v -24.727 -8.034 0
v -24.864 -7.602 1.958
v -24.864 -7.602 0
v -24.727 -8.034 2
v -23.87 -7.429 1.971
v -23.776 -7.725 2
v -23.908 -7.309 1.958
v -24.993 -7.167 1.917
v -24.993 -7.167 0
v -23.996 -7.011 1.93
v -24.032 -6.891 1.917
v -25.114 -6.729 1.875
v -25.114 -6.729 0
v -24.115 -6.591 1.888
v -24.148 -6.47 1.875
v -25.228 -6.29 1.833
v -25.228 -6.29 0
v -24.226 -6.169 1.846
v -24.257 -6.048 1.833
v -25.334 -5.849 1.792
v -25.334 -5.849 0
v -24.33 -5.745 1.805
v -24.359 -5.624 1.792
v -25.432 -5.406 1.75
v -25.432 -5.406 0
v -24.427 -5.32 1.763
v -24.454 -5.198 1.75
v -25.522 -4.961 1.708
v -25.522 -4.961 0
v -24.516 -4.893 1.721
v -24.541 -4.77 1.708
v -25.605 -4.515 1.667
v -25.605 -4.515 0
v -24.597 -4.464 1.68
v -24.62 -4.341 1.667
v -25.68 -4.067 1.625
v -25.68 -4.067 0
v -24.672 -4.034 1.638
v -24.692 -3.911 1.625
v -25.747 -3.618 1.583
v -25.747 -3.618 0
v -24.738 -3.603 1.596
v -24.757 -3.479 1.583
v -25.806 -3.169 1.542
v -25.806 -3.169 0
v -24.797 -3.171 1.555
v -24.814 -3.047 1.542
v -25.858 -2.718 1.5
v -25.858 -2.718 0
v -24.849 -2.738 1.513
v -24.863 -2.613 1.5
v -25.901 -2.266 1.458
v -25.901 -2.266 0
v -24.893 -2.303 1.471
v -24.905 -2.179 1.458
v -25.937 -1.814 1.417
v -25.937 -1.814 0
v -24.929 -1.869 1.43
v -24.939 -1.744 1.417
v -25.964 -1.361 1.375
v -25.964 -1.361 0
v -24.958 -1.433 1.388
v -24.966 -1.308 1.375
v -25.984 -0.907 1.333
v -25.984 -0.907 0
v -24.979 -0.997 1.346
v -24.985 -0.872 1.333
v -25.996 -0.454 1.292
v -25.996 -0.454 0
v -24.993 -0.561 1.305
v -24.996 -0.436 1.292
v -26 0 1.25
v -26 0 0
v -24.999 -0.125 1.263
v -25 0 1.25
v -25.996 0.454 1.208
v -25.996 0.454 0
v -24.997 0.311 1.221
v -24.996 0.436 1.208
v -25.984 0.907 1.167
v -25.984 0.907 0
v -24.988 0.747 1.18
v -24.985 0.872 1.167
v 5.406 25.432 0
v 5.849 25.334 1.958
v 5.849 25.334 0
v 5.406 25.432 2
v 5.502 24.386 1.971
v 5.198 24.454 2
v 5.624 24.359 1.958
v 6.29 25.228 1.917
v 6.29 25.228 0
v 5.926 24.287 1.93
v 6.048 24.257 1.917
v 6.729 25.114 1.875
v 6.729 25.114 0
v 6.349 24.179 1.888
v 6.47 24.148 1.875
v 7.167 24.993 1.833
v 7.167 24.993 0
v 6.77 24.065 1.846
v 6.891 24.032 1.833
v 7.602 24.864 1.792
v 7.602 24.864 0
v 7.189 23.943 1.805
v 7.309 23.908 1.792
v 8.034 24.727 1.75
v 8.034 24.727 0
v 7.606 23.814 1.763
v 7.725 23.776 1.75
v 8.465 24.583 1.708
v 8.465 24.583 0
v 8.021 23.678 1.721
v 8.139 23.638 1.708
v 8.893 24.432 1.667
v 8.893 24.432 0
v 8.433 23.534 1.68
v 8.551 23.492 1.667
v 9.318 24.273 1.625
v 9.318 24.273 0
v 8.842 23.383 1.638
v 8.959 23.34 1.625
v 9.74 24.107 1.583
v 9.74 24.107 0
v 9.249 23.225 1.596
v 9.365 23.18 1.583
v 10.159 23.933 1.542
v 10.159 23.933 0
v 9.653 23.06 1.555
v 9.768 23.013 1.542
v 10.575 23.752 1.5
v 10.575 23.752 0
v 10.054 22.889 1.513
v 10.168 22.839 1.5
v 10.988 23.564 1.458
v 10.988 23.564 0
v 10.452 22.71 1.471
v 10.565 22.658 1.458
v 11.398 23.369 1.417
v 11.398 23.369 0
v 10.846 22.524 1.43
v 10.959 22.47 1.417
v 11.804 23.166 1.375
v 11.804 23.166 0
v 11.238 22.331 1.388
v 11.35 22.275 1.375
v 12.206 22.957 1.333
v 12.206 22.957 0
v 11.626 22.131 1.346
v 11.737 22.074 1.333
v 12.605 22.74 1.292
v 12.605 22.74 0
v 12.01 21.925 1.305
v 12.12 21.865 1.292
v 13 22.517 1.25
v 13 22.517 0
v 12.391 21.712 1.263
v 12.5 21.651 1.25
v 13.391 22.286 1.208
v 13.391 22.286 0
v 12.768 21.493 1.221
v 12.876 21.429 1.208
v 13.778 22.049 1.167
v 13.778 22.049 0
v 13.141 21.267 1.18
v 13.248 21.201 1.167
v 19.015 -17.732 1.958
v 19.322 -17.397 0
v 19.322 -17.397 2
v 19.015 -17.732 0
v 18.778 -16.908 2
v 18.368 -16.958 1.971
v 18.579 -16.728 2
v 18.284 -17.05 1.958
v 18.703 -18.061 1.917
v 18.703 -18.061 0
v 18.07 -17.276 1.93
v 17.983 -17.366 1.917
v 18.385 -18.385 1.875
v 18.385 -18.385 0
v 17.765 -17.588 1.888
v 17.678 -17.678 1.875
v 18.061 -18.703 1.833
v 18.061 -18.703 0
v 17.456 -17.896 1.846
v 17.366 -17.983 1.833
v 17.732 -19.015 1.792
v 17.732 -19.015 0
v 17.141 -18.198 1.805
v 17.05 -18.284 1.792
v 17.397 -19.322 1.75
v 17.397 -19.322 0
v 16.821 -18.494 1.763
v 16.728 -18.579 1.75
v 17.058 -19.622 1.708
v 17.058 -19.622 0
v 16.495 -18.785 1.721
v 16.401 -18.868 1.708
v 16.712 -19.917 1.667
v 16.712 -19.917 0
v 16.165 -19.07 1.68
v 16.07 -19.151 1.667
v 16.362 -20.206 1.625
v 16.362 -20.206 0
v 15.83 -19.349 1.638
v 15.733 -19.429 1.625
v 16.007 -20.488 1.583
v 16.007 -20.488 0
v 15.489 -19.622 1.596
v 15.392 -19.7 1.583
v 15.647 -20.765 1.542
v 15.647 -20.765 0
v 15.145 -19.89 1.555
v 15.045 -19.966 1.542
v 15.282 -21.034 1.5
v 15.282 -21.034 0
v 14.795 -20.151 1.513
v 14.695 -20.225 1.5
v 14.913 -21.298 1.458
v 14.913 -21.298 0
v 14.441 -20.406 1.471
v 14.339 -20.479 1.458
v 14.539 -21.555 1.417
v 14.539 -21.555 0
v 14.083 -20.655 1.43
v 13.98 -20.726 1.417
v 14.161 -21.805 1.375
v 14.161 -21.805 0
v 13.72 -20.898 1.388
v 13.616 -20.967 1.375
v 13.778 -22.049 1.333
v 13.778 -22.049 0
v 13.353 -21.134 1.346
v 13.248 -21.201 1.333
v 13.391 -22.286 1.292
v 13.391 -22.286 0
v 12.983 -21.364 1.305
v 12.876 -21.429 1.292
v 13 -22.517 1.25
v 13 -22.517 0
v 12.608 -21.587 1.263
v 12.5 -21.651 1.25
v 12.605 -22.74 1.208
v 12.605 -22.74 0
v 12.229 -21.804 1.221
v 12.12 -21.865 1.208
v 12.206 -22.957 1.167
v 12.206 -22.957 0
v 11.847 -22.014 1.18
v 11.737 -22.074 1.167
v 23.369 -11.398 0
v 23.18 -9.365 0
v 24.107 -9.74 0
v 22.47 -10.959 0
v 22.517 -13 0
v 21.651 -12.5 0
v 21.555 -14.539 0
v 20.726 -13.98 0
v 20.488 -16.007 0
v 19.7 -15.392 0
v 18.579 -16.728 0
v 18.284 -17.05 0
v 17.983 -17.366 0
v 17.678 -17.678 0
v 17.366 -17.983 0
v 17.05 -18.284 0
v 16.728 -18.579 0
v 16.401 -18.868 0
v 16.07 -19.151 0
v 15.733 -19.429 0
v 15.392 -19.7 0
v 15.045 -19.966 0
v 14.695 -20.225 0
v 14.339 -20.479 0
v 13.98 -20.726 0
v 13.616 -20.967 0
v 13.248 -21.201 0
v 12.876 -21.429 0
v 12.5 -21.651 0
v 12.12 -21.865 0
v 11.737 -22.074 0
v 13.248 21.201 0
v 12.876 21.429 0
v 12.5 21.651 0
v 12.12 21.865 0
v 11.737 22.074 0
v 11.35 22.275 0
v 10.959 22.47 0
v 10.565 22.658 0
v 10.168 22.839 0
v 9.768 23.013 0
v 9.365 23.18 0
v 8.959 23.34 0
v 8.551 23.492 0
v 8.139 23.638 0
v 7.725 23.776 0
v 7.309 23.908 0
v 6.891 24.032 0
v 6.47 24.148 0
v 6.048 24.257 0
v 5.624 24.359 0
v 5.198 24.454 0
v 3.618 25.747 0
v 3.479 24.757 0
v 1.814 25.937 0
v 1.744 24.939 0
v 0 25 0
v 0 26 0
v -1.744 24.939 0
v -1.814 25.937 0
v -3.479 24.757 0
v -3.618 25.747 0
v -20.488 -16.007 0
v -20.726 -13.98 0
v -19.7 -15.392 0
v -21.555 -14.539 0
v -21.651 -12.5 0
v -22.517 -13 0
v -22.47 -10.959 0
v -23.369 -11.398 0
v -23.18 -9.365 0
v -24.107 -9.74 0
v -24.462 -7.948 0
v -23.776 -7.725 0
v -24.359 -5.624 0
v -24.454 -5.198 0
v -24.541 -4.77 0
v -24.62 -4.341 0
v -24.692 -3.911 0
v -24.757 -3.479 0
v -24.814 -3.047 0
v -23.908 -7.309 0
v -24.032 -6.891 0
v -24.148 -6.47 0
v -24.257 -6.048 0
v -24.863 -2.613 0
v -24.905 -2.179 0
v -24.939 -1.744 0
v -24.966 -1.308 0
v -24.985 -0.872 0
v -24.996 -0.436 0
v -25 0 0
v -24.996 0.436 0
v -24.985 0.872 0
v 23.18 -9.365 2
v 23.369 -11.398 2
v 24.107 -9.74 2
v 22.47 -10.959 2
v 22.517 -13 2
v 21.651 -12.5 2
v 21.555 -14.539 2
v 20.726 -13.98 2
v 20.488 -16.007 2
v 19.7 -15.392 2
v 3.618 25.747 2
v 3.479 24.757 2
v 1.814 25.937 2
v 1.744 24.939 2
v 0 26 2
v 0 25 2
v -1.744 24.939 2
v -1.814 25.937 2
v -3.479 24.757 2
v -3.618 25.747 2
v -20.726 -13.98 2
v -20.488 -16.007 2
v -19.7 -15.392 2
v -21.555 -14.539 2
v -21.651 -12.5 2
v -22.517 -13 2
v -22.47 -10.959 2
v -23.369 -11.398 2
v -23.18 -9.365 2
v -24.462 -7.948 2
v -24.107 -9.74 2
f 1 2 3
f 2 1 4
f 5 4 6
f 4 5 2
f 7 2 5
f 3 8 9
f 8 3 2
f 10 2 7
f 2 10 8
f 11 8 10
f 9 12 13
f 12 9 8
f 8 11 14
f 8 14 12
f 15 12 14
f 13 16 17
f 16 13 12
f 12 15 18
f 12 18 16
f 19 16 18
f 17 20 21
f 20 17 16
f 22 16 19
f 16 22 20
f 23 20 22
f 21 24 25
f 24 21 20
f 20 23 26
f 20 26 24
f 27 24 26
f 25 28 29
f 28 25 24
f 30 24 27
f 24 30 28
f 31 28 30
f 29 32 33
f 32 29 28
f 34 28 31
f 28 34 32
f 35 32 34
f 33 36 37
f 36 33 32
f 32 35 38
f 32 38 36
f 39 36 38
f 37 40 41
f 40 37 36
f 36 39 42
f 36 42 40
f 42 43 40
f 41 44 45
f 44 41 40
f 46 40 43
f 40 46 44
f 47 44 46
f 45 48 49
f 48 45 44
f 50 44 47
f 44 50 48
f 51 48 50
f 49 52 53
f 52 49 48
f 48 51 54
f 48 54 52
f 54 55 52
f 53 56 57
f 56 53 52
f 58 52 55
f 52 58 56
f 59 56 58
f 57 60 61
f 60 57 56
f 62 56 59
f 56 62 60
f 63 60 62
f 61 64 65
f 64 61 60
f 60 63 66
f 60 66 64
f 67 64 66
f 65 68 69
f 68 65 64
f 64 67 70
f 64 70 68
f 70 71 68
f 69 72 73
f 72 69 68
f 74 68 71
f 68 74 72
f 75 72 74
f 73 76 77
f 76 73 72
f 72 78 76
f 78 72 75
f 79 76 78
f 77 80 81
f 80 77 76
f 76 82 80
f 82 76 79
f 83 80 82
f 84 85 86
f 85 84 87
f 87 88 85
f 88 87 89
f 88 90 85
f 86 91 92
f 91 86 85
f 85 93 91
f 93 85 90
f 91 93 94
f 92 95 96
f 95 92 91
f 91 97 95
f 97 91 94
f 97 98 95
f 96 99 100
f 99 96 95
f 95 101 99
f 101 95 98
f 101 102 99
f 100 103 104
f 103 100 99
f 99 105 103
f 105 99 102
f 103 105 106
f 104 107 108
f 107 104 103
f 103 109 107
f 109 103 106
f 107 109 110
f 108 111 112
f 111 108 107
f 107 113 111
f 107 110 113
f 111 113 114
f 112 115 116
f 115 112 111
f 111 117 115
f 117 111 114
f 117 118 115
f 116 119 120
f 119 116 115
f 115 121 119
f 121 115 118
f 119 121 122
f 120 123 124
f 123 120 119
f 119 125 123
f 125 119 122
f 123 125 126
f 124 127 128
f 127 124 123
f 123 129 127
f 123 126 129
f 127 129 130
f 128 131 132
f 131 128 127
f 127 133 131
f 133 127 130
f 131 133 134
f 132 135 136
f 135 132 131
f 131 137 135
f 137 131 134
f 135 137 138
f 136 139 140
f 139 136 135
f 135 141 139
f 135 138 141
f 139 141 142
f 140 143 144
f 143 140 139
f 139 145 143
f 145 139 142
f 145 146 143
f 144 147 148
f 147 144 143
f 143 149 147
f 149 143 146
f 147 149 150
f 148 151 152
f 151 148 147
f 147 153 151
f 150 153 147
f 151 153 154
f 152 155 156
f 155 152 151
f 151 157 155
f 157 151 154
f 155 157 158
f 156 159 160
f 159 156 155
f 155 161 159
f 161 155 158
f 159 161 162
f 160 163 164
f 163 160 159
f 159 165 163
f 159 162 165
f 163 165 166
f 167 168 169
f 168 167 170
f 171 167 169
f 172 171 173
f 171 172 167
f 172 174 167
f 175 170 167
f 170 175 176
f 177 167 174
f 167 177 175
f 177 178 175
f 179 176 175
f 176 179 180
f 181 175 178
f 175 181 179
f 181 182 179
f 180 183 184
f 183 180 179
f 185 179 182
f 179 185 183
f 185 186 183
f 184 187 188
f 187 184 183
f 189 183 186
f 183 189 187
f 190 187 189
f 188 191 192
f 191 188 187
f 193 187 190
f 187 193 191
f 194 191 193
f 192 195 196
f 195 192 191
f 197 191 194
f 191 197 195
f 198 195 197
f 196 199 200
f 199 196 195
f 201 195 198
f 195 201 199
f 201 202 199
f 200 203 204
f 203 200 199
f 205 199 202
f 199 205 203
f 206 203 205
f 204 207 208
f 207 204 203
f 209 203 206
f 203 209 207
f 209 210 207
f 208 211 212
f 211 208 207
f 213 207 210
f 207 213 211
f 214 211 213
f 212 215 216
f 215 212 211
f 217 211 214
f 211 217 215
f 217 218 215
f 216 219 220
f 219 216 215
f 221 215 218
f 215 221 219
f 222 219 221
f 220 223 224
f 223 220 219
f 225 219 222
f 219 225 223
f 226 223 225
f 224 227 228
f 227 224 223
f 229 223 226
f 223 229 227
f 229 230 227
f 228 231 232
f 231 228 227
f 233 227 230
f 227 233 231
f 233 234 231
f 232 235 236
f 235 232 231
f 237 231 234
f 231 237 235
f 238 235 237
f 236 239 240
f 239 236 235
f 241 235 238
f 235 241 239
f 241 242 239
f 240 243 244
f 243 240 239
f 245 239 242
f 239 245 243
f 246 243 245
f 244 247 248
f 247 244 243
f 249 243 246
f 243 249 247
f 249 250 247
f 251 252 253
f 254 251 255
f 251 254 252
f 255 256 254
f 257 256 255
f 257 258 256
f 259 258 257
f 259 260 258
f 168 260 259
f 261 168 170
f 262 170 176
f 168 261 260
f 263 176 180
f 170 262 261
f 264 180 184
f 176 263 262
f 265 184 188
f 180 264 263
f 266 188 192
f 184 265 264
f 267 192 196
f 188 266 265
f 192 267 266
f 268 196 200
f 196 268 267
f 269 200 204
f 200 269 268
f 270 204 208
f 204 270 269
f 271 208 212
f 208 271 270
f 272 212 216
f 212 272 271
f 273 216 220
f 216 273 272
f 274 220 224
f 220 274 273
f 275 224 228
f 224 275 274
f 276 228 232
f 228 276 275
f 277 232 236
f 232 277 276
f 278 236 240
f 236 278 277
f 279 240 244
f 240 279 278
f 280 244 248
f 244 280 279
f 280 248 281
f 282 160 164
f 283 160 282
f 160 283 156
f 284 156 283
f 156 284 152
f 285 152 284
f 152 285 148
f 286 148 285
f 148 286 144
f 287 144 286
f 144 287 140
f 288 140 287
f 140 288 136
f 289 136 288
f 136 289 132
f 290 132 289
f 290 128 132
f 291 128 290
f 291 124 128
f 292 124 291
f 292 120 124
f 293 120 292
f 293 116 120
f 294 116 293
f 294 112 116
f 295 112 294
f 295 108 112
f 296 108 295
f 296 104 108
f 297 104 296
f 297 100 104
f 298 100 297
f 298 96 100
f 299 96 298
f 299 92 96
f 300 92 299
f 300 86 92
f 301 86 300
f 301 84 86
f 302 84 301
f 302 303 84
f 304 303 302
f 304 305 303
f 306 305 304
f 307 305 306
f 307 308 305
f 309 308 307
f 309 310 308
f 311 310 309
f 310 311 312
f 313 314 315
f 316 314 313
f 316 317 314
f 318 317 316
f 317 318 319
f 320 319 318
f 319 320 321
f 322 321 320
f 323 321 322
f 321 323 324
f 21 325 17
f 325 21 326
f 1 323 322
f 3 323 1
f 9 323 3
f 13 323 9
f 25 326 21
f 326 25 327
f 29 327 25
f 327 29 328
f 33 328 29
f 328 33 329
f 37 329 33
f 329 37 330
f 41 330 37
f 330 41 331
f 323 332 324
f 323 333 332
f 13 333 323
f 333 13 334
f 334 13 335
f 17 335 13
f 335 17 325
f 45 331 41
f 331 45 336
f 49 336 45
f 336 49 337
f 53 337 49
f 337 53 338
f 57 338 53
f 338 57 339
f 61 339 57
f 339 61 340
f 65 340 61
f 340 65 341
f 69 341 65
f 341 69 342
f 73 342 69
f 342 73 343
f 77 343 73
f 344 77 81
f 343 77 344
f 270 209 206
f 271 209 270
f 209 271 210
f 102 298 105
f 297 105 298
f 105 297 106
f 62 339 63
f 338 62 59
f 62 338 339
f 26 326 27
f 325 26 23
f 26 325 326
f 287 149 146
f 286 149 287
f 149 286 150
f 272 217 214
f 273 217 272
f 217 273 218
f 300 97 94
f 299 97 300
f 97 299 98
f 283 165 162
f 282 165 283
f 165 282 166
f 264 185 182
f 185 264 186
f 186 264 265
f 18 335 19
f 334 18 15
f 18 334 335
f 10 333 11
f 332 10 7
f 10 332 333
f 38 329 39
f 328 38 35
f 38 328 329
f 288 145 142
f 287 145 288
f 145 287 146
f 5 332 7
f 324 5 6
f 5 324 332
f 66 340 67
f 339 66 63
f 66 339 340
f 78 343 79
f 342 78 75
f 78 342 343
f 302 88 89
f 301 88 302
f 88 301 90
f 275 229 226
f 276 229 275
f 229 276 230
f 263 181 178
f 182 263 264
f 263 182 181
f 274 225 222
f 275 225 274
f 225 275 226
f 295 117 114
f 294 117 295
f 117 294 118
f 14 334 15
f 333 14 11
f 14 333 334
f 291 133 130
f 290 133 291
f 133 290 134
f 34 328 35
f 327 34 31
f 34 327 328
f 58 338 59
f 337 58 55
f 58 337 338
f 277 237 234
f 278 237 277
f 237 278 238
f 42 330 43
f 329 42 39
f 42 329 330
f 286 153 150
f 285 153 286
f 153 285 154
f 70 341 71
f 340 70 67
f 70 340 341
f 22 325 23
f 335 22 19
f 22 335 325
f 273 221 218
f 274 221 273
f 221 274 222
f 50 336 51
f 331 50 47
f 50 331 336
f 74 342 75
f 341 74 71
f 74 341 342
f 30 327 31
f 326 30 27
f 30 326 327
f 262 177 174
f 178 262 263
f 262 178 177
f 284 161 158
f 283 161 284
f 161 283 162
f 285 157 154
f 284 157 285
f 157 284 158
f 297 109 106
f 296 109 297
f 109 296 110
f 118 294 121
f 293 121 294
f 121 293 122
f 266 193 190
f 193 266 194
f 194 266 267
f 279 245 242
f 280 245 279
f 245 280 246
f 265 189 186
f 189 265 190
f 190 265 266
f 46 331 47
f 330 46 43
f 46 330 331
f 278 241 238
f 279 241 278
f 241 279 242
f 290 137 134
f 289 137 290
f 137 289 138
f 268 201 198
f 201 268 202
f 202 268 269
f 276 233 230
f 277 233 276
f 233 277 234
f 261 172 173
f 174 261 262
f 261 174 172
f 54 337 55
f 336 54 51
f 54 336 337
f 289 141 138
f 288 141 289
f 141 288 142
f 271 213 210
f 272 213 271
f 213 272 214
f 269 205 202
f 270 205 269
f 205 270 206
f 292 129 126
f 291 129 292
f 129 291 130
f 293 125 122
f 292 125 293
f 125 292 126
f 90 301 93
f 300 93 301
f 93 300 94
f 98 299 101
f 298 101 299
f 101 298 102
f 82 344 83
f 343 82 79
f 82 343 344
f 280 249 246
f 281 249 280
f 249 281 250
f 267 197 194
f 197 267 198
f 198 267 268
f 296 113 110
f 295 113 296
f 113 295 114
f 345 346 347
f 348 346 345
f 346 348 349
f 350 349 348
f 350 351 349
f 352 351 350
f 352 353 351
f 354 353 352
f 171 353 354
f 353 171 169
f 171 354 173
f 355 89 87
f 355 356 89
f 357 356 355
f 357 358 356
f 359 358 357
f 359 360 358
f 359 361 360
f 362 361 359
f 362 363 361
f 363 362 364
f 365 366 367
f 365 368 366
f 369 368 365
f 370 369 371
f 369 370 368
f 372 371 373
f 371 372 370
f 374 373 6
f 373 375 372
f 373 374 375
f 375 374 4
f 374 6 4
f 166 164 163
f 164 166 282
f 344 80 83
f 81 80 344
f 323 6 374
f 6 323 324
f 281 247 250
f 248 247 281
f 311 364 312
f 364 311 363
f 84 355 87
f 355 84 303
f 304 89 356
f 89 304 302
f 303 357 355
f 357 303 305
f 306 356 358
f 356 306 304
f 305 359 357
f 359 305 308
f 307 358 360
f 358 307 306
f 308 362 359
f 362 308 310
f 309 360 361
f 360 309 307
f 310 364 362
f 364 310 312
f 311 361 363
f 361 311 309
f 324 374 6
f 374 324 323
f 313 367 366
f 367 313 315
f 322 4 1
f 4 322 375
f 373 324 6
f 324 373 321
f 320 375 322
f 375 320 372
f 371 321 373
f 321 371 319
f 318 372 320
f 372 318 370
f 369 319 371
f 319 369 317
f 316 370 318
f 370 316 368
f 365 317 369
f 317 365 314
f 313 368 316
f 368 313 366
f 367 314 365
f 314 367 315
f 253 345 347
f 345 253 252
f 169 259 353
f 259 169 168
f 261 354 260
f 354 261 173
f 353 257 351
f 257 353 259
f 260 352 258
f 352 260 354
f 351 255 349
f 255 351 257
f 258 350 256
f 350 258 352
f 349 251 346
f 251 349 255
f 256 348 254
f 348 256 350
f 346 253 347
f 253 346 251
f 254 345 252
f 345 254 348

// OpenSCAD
// Threading.scad - library for threadings
// Autor: Rudolf Huttary, Berlin 2016 
// - last revision: Jan, 2021
// - tested for OpenSCAD 2021.01
// - support for multiple threads 

use <Naca_sweep.scad> // http://www.thingiverse.com/thing:900137

// examples 
//Threading_example(6);   // choose your example number

gap = 20;
difference()
{
    threading(pitch = 5, d=52, windings = 1, angle = 0, center=false, helices=3, $fn=360); 
    cylinder(d=50, h=50, $fn=360);
    translate([0,0,2])
        cylinder(d=53, h=50, $fn=360);
    rotate([0,0,-42]) rotate_extrude(angle=100, convexity=2) { translate([23,0,0]) square(5); }
    rotate([0,0,78]) rotate_extrude(angle=100, convexity=2) { translate([23,0,0]) square(5); }
    rotate([0,0,198]) rotate_extrude(angle=100, convexity=2) { translate([23,0,0]) square(5); }
}
    rotate([0,0,78]) rotate_extrude(angle=20, convexity=2, $fn=100) { translate([25,0,0]) square([1,2]); }
    rotate([0,0,198]) rotate_extrude(angle=20, convexity=2, $fn=100) { translate([25,0,0]) square([1,2]); }
    rotate([0,0,318]) rotate_extrude(angle=20, convexity=2, $fn=100) { translate([25,0,0]) square([1,2]); }

module Threading_example(number=0) 
{ 
  help(); 
  module examples(number) children(number); 
  examples(number)
  {
  // #0 thread with default values
    threading(); 

  // #1 ACME thread
    threading(pitch = 2, d=20, windings = 5, angle = 29, center=true); 

  // #2 threaded rod 20°
    threading(pitch = 2, d=20, windings = 20, angle = 20, full = true); 

  // #3 nut for left-handed threaded rod 20° 
    Threading(pitch = 2, d=20, windings = 10, angle = 20, left = true); 

  // #4 cw nut for threaded rod 20°, own diameter 25 mm, hires 
    Threading(D = 25, pitch = 2, d=20, windings = 10, angle = 20, $fn=100); 

  // #5 triple threaded rod
    threading(pitch = 2, d=20, windings = 10, helices = 3, angle = 20, full = false, $fn=100); 

  // #6 toothed rod (no pitch) 
     threading(pitch = 3, helices = 0, angle = 20, full = true); 

  // #7 toothed cube (no pitch) 
     threading(pitch = 2, helices = 0, angle = 60, full = true, $fn=4); 

  // #8 M8 hex bolt
     union()
     {
       threading(pitch = 1.25, d=7.8, windings=20, full=true); 
       cylinder(d=14.6, h=4, $fn=6);
     } 

  // #9 M8 hex bolt - left hand thread
     union()
     {
       threading(pitch = 1.25, d=7.8, windings=20, full=true, left = true); 
       cylinder(d=14.6, h=4, $fn=6);
     } 

  // #10 M8 hex nut
     Threading(D=14, pitch = 1.25, d=8.014, windings=5, edges=6);  

  // #11 M8 square nut
     Threading(D=16, pitch = 1.25, d=8.014, windings=5, edges=4);  
     
  // #12 Screw compressor
     union()
     {
      translate([0,16,0])
      threading(pitch = 8, d=20, helices=3, angle=60, left=true); 
      threading(pitch = 8, d=20, helices=3, angle=60); 
     }
  }
}
module help_Threading() help(); 
module help_threading() help(); 

module help()
{
  helpstr = str(
  "Thread library - by Rudolf Huttary (2016)", 
  "\n=========================================", 
  "\nMODULES",
  "\n========",
  "\nhelp();              \t// show help in console",
  "\nThreading_example(number=0) \t//example and test code",
  "\nthreading(pitch = 1, d = 12, windings = 10, helices = 1, angle = 60, full = false, left=false, trim=true, center=false)",
  "\nThreading(D = 0, pitch = 1, d = 12, windings = 10, helices = 1, angle = 60, left = false, edges = 0, center=false)",
  "\n\nPARAMETERS",
  "\n============",
  "\nD = {0=auto};  \t// Cyl diameter Threading()",
  "\npitch = 1;     \t// pitch [mm] ensure pitch<d/2",
  "\nd = 6;         \t// outer diameter of threading() ensure d>2*pitch",
  "\nwindings = 10; \t// # windings",
  "\nhelices = 1;   \t// # threads",
  "\nangle = 60;    \t// open angle, bolts: 60°, ACME: 29°, toothed Racks: 20°",  "edges = 40;    <i> resolution of outer cylinder",
  "\nfull = false;  \t// sleeve or filled",
  "\nleft = false;  \t// true -> ccw",
  "\ntrim=true;     \t// true -> cross cut at both sides",
  "\ncenter=false;  \t// true -> centered",
  "\nedges=0;       \t// #edges (default value->30) (Threading only)",
  "\n$fn = 360/$fa; \t// control segments per winding"  
  );
  echo (helpstr);
}

module Threading(D = 0, pitch = 1, d = 12, windings = 10, helices = 1, angle = 60, left = false, edges = 0, center=false)
{
  R = D==0?d/2+pitch/PI:D/2; 
  edges = edges?edges:360/$fa; 
  translate([0,0, center?-(windings+.5)*pitch/2:0])
  difference()
  { 
     cylinder(r=R, h = -0.01+pitch*(windings+.5), $fn=edges); 
      translate([0,0,-.005])  // avoid z-fighting
     threading(pitch=pitch, d=d, windings=windings, helices=helices, angle=angle, full = true, left=left, center=false); 
  }
}

module threading(pitch = 1, d = 12, windings = 10, helices = 1, angle = 60, full = false, left=false, trim = true, center=false)
{  // tricky: glue minimal 2 pieces together to get a proper manifold  
  r = max(d/2, pitch+.1);  
  Steps = $fn?$fn/2:180/$fa; 
  windings = max(1, trim?windings+2:windings); 
  helices = abs(helices); 
  angle = abs(angle); 
  translate([0,0,center? -pitch*(windings-1.5)/2:0])
  intersection()
  {  
    union()
    {
      if(full) 
        cylinder(r = r-2.5*pitch/PI, h=pitch*(windings-1), $fn=2*Steps); 
      scale([left?1:-1,1,1])
      translate([0,0, trim?-pitch:pitch/2])
      {  
      if(helices<=1) 
      {
        sweep(gen_dat(), convexity = 10);   // half screw
        rotate([0,0,180])
        translate([0,0,helices==0?0:-pitch/2]) 
        sweep(gen_dat(), convexity = 10);   // half screw
      }
      else
      { 
        for(i=[0:max(0,helices-1)])
        {
          rotate([0,0,360/helices*i])
          sweep(gen_dat(360/helices), convexity = 10);   // half screw
        }
      }
      }
    }
   if (trim) 
     cylinder(r=r+.2, h = 0.01+pitch*(windings-1.5), center=false); 
  }
  
  function gen_dat(until = 180) = 
    let(ang = 180, bar = R_(180, 90, 0, Ty_(-r, vec3D(pitch/PI * Rack(windings, angle)))))
    [for (i=[Steps:-1:0]) let(w = -i*ang/Steps) if(-w<=until+ang/Steps) Tz(i/2/Steps*pitch*helices, Rz_(w, bar))]; 

  function Rack(w, angle) = 
     concat([[0, 3]], 
            [for (i=[0:windings-1], j=[0:3]) 
                let(t = [ [0, 2], [2*tan(angle/2), 0], [PI/2, 0], [2*tan(angle/2)+PI/2, 2]])
            [t[j][0]+i*PI, t[j][1]]], [[w*PI, 2], [w*PI, 3]]);
}
